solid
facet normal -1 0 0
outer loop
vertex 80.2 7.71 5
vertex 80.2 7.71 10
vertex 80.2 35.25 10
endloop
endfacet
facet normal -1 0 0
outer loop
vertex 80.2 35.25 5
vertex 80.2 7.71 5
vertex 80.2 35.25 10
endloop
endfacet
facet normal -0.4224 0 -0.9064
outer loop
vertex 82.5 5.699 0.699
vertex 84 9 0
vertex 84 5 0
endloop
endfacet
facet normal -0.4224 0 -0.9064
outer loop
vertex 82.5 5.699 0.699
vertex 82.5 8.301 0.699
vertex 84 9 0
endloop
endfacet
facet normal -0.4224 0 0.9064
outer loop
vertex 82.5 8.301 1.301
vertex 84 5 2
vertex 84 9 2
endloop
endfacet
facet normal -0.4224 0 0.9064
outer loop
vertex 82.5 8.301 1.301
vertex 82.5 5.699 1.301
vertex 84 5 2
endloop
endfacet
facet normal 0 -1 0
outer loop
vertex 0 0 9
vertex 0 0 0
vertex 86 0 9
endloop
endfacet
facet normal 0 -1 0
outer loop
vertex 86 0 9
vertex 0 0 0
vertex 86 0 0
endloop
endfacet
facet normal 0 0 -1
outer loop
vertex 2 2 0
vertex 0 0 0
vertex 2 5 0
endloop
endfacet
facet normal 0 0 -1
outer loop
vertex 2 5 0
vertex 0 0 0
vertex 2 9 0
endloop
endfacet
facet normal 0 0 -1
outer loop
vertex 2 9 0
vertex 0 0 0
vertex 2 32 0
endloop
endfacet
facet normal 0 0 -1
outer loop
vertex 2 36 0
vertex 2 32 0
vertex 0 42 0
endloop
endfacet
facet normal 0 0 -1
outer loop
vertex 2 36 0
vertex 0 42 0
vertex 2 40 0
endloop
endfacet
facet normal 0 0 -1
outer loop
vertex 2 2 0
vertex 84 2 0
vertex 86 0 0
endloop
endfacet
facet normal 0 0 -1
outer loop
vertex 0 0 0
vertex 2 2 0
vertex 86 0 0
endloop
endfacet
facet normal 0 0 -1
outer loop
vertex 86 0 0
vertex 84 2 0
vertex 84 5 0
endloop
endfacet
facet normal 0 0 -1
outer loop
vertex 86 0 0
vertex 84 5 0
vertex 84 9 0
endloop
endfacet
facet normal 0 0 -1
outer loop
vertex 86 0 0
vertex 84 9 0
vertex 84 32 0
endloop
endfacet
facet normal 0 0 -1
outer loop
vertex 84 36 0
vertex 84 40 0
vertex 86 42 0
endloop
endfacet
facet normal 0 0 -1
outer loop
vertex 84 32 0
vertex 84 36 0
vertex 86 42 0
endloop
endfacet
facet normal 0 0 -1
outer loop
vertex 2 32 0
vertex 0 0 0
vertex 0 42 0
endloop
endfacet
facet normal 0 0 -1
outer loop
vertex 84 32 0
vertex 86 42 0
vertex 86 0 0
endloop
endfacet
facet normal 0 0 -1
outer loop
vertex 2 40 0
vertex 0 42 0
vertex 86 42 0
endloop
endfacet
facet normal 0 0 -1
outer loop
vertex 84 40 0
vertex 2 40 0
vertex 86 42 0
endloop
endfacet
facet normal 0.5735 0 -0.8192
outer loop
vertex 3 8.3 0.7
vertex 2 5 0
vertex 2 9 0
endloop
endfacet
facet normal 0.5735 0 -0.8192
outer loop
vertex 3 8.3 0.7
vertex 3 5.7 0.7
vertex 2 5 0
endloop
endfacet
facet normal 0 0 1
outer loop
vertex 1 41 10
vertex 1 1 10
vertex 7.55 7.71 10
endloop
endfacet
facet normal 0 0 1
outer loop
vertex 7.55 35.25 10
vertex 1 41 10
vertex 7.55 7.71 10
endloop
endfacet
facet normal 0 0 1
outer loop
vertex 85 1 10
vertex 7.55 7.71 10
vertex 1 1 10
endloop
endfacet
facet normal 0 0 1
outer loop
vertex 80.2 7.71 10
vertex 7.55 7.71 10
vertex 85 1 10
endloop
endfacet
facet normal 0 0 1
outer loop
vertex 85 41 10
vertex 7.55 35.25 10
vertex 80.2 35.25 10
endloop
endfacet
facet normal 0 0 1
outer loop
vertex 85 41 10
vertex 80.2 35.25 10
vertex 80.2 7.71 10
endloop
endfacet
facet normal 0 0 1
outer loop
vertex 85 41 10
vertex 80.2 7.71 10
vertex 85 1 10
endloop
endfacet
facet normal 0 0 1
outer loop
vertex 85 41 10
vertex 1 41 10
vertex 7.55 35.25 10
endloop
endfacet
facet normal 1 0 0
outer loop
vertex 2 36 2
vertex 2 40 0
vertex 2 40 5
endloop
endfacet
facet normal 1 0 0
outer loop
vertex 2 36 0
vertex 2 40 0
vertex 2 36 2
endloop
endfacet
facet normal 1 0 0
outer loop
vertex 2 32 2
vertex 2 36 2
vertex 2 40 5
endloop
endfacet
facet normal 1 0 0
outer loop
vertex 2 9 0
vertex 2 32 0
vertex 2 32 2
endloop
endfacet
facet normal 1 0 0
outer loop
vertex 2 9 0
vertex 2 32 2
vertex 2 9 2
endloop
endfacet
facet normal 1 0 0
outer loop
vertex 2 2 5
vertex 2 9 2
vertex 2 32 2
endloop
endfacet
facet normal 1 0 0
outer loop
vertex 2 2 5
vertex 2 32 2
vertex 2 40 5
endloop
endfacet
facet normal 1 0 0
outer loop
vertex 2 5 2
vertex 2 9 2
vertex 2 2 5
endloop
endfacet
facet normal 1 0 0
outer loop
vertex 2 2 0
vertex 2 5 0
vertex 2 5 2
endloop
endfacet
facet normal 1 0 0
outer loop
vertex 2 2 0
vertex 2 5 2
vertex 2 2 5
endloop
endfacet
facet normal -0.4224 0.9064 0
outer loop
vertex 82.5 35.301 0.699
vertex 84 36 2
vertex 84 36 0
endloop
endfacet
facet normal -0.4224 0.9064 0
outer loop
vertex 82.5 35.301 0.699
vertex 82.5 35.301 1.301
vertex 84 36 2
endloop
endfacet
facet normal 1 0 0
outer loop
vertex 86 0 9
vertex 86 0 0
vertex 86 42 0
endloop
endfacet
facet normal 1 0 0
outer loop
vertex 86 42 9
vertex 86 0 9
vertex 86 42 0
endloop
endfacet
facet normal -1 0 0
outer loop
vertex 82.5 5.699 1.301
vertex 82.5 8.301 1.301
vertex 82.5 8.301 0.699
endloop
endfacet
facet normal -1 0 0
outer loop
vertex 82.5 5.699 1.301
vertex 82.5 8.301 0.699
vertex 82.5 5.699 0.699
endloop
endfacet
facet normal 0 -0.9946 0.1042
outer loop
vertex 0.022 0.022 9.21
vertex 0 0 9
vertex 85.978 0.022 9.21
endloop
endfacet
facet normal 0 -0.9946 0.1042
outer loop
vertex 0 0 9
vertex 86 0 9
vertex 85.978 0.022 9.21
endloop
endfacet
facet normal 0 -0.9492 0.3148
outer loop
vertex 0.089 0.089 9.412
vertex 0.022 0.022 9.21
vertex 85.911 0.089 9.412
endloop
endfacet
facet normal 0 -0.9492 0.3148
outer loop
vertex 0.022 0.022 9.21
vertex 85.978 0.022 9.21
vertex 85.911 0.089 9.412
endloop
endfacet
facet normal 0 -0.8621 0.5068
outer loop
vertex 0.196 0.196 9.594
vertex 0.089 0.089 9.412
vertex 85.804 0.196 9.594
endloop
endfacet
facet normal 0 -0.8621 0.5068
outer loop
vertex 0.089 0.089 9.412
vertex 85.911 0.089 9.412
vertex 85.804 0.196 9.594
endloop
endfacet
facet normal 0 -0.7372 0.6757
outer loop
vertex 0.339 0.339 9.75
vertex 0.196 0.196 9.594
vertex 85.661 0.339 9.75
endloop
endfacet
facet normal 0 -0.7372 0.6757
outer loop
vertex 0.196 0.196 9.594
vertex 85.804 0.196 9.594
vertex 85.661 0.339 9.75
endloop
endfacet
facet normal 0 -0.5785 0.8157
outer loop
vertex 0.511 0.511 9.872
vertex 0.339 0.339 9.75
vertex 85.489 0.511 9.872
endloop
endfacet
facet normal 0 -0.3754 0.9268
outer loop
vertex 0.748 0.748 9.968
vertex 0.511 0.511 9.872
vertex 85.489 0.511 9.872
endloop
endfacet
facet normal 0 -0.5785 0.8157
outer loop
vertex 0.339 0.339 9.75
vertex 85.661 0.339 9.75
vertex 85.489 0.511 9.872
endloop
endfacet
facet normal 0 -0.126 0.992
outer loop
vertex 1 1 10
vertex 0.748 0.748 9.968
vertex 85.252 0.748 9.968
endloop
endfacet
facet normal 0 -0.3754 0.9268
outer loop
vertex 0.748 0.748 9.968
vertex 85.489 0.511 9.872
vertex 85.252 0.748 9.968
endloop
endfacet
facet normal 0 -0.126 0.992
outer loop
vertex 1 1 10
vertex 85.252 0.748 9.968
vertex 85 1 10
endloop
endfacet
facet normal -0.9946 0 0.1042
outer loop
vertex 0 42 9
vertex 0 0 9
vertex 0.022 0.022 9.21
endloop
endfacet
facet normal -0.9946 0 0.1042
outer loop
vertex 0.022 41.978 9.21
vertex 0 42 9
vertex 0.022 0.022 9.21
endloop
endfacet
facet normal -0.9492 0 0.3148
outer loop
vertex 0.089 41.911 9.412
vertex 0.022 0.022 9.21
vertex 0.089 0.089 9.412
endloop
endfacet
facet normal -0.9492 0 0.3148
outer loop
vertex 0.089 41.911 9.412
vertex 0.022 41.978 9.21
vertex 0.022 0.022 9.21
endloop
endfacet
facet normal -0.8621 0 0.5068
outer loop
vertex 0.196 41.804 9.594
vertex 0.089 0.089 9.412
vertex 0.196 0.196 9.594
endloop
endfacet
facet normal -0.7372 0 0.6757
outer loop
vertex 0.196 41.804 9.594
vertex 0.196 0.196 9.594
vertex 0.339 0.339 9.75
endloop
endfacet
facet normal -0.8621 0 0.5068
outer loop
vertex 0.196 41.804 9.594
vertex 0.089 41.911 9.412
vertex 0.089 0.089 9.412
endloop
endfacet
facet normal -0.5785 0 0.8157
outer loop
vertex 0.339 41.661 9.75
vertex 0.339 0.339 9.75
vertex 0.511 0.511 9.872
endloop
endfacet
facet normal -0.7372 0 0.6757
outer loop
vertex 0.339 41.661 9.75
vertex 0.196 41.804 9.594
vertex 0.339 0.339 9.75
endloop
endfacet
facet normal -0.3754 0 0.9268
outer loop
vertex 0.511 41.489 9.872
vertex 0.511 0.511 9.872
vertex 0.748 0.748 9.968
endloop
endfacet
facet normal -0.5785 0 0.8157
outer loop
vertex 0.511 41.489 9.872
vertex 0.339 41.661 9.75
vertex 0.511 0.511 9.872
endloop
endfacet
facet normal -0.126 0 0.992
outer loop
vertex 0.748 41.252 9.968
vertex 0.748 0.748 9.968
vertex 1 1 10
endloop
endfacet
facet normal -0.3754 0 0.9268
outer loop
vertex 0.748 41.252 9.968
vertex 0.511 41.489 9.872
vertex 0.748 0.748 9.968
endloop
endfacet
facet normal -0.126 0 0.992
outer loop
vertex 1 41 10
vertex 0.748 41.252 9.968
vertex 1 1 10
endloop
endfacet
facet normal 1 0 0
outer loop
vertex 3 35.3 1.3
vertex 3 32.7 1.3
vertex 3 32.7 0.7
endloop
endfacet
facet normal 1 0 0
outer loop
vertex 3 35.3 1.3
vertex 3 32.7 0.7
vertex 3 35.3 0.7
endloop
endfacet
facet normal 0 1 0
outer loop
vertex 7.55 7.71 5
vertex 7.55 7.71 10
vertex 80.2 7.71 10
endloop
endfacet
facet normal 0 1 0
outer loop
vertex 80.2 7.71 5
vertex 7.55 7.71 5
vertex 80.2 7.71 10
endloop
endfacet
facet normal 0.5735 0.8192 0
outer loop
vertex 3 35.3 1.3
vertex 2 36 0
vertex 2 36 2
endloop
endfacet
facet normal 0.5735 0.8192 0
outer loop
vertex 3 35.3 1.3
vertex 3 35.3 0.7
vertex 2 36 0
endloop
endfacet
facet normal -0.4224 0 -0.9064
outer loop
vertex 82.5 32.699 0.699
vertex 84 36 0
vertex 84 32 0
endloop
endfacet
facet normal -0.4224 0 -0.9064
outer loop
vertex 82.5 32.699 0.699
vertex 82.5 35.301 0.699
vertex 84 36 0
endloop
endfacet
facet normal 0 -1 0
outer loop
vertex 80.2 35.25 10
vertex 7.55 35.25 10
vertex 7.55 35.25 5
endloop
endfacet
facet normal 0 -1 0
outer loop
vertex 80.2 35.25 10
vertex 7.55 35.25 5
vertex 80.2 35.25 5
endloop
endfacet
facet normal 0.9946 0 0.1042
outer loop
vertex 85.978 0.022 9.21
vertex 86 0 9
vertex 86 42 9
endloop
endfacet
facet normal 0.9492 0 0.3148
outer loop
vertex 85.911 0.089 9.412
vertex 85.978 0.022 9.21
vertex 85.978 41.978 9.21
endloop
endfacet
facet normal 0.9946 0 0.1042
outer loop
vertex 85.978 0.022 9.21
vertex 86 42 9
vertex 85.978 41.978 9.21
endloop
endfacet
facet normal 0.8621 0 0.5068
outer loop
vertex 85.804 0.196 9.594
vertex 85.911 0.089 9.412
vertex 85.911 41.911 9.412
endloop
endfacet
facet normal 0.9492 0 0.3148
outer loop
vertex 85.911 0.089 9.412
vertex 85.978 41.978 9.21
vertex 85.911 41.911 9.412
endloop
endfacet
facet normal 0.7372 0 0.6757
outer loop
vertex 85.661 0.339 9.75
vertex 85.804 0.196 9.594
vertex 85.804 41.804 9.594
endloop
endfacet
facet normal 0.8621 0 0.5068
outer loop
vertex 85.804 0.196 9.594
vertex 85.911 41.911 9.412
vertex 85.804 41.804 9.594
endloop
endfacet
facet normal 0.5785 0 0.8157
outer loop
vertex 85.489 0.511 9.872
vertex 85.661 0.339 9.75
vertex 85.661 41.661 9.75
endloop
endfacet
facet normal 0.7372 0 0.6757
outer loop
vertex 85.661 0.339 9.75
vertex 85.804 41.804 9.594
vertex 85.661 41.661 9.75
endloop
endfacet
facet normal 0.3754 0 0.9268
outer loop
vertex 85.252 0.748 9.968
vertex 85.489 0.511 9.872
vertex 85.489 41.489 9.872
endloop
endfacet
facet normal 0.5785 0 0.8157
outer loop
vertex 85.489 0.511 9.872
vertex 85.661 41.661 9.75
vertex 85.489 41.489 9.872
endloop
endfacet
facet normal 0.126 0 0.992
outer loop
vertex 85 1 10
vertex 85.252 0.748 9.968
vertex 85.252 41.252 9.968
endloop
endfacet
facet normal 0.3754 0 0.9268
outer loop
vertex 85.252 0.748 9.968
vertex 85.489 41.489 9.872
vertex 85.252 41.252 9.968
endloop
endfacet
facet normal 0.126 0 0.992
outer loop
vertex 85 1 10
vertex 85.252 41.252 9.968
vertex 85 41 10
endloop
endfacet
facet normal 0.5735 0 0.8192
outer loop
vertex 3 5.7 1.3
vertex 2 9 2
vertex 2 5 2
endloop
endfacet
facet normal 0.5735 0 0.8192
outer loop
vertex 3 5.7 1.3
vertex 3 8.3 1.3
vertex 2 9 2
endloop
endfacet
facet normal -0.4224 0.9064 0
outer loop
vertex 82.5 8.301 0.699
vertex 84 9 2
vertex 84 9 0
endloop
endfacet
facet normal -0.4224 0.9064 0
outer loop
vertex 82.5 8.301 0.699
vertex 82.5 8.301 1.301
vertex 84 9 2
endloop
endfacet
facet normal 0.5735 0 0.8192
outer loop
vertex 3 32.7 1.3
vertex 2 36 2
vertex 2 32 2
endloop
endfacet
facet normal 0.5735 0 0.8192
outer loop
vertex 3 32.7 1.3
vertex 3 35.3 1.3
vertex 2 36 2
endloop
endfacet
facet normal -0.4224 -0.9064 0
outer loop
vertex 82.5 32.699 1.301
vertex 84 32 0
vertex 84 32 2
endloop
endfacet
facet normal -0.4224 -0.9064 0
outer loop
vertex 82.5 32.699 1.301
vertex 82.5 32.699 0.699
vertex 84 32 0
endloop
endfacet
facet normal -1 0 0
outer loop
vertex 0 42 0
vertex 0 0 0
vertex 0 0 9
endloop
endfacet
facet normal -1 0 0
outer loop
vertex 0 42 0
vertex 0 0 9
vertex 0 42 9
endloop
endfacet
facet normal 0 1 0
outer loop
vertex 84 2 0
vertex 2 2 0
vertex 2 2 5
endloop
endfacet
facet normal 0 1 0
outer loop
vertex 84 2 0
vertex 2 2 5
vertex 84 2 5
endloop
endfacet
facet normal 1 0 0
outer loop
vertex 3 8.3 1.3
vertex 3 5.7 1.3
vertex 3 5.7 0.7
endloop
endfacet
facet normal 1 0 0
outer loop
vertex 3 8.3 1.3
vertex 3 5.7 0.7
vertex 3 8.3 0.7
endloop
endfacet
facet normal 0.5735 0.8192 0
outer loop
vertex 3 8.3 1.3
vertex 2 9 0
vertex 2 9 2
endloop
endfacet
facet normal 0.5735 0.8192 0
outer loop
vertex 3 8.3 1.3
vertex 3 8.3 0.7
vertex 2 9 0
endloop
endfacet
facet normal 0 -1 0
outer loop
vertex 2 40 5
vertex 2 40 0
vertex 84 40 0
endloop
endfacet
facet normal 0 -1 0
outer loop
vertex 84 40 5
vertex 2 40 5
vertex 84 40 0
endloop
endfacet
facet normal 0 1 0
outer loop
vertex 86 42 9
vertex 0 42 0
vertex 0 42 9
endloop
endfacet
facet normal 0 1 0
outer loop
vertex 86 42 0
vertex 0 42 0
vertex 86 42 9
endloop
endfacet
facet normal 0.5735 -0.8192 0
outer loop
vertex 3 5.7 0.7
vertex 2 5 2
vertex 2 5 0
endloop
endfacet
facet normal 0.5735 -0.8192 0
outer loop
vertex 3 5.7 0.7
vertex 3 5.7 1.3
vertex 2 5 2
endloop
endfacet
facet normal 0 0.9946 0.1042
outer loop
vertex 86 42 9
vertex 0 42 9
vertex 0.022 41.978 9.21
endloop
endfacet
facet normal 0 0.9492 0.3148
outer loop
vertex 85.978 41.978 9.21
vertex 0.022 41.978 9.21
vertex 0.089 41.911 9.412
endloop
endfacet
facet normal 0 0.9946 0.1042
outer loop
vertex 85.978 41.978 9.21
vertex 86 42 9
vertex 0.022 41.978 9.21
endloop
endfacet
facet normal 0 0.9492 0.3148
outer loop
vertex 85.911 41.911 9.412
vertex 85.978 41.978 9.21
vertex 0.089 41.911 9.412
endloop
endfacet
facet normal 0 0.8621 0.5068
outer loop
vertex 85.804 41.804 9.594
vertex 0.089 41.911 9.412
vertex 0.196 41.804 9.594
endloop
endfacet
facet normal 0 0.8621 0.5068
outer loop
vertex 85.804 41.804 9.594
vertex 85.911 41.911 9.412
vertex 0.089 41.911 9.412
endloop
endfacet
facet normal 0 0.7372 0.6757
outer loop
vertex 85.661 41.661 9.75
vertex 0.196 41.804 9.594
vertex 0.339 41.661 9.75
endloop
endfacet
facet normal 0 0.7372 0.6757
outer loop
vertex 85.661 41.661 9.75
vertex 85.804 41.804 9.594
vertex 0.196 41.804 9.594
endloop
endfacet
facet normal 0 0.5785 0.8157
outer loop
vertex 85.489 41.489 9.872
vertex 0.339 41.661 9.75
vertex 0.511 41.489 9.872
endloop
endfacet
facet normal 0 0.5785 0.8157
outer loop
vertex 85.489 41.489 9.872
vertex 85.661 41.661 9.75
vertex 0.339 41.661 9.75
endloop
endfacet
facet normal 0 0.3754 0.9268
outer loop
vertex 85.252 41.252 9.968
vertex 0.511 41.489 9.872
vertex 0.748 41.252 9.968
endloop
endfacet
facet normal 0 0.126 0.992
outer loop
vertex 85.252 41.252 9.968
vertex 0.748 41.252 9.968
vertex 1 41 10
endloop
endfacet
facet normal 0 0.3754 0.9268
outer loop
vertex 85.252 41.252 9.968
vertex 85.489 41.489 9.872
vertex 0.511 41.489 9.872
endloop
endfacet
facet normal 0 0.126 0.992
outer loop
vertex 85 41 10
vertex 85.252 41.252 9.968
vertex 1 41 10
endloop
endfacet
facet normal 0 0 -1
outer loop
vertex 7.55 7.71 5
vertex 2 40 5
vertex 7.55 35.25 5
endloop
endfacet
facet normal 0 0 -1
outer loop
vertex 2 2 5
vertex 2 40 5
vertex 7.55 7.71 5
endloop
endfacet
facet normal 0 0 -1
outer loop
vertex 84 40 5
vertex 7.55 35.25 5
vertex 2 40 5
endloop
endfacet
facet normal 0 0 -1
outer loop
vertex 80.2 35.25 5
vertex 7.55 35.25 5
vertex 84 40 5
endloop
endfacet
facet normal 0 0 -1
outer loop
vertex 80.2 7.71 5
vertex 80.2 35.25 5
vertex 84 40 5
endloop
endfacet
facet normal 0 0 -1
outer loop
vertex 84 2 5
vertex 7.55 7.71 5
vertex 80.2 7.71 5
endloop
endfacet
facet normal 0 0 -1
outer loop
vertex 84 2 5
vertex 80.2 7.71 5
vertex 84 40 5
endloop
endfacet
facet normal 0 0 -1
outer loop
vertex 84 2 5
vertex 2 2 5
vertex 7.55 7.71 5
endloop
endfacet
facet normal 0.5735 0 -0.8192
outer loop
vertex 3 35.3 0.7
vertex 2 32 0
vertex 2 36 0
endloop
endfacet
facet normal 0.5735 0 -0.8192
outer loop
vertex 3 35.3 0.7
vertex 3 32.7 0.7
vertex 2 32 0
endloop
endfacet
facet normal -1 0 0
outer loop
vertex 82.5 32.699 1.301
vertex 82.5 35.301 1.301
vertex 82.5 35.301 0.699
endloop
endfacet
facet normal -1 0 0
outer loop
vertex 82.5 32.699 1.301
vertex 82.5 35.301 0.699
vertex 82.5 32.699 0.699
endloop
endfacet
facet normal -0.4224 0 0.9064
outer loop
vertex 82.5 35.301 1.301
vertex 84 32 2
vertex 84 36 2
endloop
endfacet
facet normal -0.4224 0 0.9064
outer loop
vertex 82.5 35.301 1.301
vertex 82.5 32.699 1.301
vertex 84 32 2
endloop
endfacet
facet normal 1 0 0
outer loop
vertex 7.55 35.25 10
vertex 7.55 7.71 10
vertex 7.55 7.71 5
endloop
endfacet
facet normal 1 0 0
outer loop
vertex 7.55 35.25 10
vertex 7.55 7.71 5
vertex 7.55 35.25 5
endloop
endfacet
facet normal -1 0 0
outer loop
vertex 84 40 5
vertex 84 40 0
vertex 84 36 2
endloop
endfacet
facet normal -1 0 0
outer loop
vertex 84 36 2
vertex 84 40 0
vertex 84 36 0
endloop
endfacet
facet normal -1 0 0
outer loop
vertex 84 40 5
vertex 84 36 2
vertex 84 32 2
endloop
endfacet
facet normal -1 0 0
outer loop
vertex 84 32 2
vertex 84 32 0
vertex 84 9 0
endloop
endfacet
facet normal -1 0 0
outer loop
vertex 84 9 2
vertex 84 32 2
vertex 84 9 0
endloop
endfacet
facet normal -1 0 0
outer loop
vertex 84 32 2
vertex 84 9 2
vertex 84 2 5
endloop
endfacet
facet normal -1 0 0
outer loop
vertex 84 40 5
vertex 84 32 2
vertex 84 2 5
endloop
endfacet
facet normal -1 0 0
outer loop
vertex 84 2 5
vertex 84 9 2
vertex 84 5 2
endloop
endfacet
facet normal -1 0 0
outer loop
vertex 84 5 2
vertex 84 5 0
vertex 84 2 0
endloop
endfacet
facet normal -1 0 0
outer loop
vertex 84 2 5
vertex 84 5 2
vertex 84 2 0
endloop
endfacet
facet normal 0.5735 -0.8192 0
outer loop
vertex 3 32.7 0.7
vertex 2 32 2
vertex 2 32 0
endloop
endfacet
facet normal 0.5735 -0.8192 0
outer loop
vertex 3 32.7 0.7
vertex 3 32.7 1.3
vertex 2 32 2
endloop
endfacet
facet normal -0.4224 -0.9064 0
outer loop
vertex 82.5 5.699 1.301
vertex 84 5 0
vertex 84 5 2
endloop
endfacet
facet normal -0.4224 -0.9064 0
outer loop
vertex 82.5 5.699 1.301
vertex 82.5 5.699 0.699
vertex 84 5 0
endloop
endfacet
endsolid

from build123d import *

# Parameters (mm, degrees)
SKETCH_W               = 86
SKETCH_H               = 42
PAD_DEPTH              = 10
FILLET_R               = 1
SKETCH001_W            = 72.65
SKETCH001_H            = 27.54
POCKET_DEPTH           = 10
SKETCH002_W            = 82
SKETCH002_H            = 38
POCKET001_DEPTH        = 5
SKETCH003_W            = 4
SKETCH003_H            = 2
PAD001_DEPTH           = 1.5
PAD001_TAPER           = 25
LINEARPATTERN_COUNT    = 2
LINEARPATTERN_PITCH    = 27
SKETCH004_W            = 4
SKETCH004_H            = 2
PAD002_DEPTH           = 1
PAD002_TAPER           = 35
LINEARPATTERN001_COUNT = 2
LINEARPATTERN001_PITCH = 27


with BuildPart() as part:
    # Sketch → Pad (new body)
    with BuildSketch(Plane.XY):
        with Locations((43, 21)):
            Rectangle(SKETCH_W, SKETCH_H)
    extrude(amount=PAD_DEPTH)

    # Fillet
    fillet_edges = [part.edges().sort_by_distance(p)[0] for p in [
        (43, 42, 10),
        (86, 21, 10),
        (43, 0, 10),
        (0, 21, 10),
    ]]
    fillet(fillet_edges, radius=FILLET_R)

    # Sketch001 (on Face8 of Fillet) → Pocket (cut)
    with BuildSketch(Plane.XY.offset(10)):
        with Locations((43.875, 21.48)):
            Rectangle(SKETCH001_W, SKETCH001_H)
    extrude(amount=-POCKET_DEPTH, mode=Mode.SUBTRACT)

    # Sketch002 (on Face4 of Pocket) → Pocket001 (cut)
    with BuildSketch(Plane(origin=(0, 0, 0), x_dir=(1, 0, 0), z_dir=(0, 0, -1))):
        with Locations((43, -21)):
            Rectangle(SKETCH002_W, SKETCH002_H)
    extrude(amount=-POCKET001_DEPTH, mode=Mode.SUBTRACT)

    # Sketch003 (on Face11 of Pocket001) → Pad001 (join)
    with BuildSketch(Plane(origin=(84, 0, 0), x_dir=(0, -1, 0), z_dir=(-1, 0, 0))):
        with Locations((-7, 1)):
            Rectangle(SKETCH003_W, SKETCH003_H)
    pad001 = extrude(amount=PAD001_DEPTH, taper=PAD001_TAPER)

    # LinearPattern: Pad001 ×2
    with Locations(*[(0, i * LINEARPATTERN_PITCH, 0) for i in range(1, LINEARPATTERN_COUNT)]):
        add(pad001)

    # Sketch004 (on Face15 of LinearPattern) → Pad002 (join)
    with BuildSketch(Plane.YZ.offset(2)):
        with Locations((7, 1)):
            Rectangle(SKETCH004_W, SKETCH004_H)
    pad002 = extrude(amount=PAD002_DEPTH, taper=PAD002_TAPER)

    # LinearPattern001: Pad002 ×2
    with Locations(*[(0, i * LINEARPATTERN001_PITCH, 0) for i in range(1, LINEARPATTERN001_COUNT)]):
        add(pad002)


solid = part.part
